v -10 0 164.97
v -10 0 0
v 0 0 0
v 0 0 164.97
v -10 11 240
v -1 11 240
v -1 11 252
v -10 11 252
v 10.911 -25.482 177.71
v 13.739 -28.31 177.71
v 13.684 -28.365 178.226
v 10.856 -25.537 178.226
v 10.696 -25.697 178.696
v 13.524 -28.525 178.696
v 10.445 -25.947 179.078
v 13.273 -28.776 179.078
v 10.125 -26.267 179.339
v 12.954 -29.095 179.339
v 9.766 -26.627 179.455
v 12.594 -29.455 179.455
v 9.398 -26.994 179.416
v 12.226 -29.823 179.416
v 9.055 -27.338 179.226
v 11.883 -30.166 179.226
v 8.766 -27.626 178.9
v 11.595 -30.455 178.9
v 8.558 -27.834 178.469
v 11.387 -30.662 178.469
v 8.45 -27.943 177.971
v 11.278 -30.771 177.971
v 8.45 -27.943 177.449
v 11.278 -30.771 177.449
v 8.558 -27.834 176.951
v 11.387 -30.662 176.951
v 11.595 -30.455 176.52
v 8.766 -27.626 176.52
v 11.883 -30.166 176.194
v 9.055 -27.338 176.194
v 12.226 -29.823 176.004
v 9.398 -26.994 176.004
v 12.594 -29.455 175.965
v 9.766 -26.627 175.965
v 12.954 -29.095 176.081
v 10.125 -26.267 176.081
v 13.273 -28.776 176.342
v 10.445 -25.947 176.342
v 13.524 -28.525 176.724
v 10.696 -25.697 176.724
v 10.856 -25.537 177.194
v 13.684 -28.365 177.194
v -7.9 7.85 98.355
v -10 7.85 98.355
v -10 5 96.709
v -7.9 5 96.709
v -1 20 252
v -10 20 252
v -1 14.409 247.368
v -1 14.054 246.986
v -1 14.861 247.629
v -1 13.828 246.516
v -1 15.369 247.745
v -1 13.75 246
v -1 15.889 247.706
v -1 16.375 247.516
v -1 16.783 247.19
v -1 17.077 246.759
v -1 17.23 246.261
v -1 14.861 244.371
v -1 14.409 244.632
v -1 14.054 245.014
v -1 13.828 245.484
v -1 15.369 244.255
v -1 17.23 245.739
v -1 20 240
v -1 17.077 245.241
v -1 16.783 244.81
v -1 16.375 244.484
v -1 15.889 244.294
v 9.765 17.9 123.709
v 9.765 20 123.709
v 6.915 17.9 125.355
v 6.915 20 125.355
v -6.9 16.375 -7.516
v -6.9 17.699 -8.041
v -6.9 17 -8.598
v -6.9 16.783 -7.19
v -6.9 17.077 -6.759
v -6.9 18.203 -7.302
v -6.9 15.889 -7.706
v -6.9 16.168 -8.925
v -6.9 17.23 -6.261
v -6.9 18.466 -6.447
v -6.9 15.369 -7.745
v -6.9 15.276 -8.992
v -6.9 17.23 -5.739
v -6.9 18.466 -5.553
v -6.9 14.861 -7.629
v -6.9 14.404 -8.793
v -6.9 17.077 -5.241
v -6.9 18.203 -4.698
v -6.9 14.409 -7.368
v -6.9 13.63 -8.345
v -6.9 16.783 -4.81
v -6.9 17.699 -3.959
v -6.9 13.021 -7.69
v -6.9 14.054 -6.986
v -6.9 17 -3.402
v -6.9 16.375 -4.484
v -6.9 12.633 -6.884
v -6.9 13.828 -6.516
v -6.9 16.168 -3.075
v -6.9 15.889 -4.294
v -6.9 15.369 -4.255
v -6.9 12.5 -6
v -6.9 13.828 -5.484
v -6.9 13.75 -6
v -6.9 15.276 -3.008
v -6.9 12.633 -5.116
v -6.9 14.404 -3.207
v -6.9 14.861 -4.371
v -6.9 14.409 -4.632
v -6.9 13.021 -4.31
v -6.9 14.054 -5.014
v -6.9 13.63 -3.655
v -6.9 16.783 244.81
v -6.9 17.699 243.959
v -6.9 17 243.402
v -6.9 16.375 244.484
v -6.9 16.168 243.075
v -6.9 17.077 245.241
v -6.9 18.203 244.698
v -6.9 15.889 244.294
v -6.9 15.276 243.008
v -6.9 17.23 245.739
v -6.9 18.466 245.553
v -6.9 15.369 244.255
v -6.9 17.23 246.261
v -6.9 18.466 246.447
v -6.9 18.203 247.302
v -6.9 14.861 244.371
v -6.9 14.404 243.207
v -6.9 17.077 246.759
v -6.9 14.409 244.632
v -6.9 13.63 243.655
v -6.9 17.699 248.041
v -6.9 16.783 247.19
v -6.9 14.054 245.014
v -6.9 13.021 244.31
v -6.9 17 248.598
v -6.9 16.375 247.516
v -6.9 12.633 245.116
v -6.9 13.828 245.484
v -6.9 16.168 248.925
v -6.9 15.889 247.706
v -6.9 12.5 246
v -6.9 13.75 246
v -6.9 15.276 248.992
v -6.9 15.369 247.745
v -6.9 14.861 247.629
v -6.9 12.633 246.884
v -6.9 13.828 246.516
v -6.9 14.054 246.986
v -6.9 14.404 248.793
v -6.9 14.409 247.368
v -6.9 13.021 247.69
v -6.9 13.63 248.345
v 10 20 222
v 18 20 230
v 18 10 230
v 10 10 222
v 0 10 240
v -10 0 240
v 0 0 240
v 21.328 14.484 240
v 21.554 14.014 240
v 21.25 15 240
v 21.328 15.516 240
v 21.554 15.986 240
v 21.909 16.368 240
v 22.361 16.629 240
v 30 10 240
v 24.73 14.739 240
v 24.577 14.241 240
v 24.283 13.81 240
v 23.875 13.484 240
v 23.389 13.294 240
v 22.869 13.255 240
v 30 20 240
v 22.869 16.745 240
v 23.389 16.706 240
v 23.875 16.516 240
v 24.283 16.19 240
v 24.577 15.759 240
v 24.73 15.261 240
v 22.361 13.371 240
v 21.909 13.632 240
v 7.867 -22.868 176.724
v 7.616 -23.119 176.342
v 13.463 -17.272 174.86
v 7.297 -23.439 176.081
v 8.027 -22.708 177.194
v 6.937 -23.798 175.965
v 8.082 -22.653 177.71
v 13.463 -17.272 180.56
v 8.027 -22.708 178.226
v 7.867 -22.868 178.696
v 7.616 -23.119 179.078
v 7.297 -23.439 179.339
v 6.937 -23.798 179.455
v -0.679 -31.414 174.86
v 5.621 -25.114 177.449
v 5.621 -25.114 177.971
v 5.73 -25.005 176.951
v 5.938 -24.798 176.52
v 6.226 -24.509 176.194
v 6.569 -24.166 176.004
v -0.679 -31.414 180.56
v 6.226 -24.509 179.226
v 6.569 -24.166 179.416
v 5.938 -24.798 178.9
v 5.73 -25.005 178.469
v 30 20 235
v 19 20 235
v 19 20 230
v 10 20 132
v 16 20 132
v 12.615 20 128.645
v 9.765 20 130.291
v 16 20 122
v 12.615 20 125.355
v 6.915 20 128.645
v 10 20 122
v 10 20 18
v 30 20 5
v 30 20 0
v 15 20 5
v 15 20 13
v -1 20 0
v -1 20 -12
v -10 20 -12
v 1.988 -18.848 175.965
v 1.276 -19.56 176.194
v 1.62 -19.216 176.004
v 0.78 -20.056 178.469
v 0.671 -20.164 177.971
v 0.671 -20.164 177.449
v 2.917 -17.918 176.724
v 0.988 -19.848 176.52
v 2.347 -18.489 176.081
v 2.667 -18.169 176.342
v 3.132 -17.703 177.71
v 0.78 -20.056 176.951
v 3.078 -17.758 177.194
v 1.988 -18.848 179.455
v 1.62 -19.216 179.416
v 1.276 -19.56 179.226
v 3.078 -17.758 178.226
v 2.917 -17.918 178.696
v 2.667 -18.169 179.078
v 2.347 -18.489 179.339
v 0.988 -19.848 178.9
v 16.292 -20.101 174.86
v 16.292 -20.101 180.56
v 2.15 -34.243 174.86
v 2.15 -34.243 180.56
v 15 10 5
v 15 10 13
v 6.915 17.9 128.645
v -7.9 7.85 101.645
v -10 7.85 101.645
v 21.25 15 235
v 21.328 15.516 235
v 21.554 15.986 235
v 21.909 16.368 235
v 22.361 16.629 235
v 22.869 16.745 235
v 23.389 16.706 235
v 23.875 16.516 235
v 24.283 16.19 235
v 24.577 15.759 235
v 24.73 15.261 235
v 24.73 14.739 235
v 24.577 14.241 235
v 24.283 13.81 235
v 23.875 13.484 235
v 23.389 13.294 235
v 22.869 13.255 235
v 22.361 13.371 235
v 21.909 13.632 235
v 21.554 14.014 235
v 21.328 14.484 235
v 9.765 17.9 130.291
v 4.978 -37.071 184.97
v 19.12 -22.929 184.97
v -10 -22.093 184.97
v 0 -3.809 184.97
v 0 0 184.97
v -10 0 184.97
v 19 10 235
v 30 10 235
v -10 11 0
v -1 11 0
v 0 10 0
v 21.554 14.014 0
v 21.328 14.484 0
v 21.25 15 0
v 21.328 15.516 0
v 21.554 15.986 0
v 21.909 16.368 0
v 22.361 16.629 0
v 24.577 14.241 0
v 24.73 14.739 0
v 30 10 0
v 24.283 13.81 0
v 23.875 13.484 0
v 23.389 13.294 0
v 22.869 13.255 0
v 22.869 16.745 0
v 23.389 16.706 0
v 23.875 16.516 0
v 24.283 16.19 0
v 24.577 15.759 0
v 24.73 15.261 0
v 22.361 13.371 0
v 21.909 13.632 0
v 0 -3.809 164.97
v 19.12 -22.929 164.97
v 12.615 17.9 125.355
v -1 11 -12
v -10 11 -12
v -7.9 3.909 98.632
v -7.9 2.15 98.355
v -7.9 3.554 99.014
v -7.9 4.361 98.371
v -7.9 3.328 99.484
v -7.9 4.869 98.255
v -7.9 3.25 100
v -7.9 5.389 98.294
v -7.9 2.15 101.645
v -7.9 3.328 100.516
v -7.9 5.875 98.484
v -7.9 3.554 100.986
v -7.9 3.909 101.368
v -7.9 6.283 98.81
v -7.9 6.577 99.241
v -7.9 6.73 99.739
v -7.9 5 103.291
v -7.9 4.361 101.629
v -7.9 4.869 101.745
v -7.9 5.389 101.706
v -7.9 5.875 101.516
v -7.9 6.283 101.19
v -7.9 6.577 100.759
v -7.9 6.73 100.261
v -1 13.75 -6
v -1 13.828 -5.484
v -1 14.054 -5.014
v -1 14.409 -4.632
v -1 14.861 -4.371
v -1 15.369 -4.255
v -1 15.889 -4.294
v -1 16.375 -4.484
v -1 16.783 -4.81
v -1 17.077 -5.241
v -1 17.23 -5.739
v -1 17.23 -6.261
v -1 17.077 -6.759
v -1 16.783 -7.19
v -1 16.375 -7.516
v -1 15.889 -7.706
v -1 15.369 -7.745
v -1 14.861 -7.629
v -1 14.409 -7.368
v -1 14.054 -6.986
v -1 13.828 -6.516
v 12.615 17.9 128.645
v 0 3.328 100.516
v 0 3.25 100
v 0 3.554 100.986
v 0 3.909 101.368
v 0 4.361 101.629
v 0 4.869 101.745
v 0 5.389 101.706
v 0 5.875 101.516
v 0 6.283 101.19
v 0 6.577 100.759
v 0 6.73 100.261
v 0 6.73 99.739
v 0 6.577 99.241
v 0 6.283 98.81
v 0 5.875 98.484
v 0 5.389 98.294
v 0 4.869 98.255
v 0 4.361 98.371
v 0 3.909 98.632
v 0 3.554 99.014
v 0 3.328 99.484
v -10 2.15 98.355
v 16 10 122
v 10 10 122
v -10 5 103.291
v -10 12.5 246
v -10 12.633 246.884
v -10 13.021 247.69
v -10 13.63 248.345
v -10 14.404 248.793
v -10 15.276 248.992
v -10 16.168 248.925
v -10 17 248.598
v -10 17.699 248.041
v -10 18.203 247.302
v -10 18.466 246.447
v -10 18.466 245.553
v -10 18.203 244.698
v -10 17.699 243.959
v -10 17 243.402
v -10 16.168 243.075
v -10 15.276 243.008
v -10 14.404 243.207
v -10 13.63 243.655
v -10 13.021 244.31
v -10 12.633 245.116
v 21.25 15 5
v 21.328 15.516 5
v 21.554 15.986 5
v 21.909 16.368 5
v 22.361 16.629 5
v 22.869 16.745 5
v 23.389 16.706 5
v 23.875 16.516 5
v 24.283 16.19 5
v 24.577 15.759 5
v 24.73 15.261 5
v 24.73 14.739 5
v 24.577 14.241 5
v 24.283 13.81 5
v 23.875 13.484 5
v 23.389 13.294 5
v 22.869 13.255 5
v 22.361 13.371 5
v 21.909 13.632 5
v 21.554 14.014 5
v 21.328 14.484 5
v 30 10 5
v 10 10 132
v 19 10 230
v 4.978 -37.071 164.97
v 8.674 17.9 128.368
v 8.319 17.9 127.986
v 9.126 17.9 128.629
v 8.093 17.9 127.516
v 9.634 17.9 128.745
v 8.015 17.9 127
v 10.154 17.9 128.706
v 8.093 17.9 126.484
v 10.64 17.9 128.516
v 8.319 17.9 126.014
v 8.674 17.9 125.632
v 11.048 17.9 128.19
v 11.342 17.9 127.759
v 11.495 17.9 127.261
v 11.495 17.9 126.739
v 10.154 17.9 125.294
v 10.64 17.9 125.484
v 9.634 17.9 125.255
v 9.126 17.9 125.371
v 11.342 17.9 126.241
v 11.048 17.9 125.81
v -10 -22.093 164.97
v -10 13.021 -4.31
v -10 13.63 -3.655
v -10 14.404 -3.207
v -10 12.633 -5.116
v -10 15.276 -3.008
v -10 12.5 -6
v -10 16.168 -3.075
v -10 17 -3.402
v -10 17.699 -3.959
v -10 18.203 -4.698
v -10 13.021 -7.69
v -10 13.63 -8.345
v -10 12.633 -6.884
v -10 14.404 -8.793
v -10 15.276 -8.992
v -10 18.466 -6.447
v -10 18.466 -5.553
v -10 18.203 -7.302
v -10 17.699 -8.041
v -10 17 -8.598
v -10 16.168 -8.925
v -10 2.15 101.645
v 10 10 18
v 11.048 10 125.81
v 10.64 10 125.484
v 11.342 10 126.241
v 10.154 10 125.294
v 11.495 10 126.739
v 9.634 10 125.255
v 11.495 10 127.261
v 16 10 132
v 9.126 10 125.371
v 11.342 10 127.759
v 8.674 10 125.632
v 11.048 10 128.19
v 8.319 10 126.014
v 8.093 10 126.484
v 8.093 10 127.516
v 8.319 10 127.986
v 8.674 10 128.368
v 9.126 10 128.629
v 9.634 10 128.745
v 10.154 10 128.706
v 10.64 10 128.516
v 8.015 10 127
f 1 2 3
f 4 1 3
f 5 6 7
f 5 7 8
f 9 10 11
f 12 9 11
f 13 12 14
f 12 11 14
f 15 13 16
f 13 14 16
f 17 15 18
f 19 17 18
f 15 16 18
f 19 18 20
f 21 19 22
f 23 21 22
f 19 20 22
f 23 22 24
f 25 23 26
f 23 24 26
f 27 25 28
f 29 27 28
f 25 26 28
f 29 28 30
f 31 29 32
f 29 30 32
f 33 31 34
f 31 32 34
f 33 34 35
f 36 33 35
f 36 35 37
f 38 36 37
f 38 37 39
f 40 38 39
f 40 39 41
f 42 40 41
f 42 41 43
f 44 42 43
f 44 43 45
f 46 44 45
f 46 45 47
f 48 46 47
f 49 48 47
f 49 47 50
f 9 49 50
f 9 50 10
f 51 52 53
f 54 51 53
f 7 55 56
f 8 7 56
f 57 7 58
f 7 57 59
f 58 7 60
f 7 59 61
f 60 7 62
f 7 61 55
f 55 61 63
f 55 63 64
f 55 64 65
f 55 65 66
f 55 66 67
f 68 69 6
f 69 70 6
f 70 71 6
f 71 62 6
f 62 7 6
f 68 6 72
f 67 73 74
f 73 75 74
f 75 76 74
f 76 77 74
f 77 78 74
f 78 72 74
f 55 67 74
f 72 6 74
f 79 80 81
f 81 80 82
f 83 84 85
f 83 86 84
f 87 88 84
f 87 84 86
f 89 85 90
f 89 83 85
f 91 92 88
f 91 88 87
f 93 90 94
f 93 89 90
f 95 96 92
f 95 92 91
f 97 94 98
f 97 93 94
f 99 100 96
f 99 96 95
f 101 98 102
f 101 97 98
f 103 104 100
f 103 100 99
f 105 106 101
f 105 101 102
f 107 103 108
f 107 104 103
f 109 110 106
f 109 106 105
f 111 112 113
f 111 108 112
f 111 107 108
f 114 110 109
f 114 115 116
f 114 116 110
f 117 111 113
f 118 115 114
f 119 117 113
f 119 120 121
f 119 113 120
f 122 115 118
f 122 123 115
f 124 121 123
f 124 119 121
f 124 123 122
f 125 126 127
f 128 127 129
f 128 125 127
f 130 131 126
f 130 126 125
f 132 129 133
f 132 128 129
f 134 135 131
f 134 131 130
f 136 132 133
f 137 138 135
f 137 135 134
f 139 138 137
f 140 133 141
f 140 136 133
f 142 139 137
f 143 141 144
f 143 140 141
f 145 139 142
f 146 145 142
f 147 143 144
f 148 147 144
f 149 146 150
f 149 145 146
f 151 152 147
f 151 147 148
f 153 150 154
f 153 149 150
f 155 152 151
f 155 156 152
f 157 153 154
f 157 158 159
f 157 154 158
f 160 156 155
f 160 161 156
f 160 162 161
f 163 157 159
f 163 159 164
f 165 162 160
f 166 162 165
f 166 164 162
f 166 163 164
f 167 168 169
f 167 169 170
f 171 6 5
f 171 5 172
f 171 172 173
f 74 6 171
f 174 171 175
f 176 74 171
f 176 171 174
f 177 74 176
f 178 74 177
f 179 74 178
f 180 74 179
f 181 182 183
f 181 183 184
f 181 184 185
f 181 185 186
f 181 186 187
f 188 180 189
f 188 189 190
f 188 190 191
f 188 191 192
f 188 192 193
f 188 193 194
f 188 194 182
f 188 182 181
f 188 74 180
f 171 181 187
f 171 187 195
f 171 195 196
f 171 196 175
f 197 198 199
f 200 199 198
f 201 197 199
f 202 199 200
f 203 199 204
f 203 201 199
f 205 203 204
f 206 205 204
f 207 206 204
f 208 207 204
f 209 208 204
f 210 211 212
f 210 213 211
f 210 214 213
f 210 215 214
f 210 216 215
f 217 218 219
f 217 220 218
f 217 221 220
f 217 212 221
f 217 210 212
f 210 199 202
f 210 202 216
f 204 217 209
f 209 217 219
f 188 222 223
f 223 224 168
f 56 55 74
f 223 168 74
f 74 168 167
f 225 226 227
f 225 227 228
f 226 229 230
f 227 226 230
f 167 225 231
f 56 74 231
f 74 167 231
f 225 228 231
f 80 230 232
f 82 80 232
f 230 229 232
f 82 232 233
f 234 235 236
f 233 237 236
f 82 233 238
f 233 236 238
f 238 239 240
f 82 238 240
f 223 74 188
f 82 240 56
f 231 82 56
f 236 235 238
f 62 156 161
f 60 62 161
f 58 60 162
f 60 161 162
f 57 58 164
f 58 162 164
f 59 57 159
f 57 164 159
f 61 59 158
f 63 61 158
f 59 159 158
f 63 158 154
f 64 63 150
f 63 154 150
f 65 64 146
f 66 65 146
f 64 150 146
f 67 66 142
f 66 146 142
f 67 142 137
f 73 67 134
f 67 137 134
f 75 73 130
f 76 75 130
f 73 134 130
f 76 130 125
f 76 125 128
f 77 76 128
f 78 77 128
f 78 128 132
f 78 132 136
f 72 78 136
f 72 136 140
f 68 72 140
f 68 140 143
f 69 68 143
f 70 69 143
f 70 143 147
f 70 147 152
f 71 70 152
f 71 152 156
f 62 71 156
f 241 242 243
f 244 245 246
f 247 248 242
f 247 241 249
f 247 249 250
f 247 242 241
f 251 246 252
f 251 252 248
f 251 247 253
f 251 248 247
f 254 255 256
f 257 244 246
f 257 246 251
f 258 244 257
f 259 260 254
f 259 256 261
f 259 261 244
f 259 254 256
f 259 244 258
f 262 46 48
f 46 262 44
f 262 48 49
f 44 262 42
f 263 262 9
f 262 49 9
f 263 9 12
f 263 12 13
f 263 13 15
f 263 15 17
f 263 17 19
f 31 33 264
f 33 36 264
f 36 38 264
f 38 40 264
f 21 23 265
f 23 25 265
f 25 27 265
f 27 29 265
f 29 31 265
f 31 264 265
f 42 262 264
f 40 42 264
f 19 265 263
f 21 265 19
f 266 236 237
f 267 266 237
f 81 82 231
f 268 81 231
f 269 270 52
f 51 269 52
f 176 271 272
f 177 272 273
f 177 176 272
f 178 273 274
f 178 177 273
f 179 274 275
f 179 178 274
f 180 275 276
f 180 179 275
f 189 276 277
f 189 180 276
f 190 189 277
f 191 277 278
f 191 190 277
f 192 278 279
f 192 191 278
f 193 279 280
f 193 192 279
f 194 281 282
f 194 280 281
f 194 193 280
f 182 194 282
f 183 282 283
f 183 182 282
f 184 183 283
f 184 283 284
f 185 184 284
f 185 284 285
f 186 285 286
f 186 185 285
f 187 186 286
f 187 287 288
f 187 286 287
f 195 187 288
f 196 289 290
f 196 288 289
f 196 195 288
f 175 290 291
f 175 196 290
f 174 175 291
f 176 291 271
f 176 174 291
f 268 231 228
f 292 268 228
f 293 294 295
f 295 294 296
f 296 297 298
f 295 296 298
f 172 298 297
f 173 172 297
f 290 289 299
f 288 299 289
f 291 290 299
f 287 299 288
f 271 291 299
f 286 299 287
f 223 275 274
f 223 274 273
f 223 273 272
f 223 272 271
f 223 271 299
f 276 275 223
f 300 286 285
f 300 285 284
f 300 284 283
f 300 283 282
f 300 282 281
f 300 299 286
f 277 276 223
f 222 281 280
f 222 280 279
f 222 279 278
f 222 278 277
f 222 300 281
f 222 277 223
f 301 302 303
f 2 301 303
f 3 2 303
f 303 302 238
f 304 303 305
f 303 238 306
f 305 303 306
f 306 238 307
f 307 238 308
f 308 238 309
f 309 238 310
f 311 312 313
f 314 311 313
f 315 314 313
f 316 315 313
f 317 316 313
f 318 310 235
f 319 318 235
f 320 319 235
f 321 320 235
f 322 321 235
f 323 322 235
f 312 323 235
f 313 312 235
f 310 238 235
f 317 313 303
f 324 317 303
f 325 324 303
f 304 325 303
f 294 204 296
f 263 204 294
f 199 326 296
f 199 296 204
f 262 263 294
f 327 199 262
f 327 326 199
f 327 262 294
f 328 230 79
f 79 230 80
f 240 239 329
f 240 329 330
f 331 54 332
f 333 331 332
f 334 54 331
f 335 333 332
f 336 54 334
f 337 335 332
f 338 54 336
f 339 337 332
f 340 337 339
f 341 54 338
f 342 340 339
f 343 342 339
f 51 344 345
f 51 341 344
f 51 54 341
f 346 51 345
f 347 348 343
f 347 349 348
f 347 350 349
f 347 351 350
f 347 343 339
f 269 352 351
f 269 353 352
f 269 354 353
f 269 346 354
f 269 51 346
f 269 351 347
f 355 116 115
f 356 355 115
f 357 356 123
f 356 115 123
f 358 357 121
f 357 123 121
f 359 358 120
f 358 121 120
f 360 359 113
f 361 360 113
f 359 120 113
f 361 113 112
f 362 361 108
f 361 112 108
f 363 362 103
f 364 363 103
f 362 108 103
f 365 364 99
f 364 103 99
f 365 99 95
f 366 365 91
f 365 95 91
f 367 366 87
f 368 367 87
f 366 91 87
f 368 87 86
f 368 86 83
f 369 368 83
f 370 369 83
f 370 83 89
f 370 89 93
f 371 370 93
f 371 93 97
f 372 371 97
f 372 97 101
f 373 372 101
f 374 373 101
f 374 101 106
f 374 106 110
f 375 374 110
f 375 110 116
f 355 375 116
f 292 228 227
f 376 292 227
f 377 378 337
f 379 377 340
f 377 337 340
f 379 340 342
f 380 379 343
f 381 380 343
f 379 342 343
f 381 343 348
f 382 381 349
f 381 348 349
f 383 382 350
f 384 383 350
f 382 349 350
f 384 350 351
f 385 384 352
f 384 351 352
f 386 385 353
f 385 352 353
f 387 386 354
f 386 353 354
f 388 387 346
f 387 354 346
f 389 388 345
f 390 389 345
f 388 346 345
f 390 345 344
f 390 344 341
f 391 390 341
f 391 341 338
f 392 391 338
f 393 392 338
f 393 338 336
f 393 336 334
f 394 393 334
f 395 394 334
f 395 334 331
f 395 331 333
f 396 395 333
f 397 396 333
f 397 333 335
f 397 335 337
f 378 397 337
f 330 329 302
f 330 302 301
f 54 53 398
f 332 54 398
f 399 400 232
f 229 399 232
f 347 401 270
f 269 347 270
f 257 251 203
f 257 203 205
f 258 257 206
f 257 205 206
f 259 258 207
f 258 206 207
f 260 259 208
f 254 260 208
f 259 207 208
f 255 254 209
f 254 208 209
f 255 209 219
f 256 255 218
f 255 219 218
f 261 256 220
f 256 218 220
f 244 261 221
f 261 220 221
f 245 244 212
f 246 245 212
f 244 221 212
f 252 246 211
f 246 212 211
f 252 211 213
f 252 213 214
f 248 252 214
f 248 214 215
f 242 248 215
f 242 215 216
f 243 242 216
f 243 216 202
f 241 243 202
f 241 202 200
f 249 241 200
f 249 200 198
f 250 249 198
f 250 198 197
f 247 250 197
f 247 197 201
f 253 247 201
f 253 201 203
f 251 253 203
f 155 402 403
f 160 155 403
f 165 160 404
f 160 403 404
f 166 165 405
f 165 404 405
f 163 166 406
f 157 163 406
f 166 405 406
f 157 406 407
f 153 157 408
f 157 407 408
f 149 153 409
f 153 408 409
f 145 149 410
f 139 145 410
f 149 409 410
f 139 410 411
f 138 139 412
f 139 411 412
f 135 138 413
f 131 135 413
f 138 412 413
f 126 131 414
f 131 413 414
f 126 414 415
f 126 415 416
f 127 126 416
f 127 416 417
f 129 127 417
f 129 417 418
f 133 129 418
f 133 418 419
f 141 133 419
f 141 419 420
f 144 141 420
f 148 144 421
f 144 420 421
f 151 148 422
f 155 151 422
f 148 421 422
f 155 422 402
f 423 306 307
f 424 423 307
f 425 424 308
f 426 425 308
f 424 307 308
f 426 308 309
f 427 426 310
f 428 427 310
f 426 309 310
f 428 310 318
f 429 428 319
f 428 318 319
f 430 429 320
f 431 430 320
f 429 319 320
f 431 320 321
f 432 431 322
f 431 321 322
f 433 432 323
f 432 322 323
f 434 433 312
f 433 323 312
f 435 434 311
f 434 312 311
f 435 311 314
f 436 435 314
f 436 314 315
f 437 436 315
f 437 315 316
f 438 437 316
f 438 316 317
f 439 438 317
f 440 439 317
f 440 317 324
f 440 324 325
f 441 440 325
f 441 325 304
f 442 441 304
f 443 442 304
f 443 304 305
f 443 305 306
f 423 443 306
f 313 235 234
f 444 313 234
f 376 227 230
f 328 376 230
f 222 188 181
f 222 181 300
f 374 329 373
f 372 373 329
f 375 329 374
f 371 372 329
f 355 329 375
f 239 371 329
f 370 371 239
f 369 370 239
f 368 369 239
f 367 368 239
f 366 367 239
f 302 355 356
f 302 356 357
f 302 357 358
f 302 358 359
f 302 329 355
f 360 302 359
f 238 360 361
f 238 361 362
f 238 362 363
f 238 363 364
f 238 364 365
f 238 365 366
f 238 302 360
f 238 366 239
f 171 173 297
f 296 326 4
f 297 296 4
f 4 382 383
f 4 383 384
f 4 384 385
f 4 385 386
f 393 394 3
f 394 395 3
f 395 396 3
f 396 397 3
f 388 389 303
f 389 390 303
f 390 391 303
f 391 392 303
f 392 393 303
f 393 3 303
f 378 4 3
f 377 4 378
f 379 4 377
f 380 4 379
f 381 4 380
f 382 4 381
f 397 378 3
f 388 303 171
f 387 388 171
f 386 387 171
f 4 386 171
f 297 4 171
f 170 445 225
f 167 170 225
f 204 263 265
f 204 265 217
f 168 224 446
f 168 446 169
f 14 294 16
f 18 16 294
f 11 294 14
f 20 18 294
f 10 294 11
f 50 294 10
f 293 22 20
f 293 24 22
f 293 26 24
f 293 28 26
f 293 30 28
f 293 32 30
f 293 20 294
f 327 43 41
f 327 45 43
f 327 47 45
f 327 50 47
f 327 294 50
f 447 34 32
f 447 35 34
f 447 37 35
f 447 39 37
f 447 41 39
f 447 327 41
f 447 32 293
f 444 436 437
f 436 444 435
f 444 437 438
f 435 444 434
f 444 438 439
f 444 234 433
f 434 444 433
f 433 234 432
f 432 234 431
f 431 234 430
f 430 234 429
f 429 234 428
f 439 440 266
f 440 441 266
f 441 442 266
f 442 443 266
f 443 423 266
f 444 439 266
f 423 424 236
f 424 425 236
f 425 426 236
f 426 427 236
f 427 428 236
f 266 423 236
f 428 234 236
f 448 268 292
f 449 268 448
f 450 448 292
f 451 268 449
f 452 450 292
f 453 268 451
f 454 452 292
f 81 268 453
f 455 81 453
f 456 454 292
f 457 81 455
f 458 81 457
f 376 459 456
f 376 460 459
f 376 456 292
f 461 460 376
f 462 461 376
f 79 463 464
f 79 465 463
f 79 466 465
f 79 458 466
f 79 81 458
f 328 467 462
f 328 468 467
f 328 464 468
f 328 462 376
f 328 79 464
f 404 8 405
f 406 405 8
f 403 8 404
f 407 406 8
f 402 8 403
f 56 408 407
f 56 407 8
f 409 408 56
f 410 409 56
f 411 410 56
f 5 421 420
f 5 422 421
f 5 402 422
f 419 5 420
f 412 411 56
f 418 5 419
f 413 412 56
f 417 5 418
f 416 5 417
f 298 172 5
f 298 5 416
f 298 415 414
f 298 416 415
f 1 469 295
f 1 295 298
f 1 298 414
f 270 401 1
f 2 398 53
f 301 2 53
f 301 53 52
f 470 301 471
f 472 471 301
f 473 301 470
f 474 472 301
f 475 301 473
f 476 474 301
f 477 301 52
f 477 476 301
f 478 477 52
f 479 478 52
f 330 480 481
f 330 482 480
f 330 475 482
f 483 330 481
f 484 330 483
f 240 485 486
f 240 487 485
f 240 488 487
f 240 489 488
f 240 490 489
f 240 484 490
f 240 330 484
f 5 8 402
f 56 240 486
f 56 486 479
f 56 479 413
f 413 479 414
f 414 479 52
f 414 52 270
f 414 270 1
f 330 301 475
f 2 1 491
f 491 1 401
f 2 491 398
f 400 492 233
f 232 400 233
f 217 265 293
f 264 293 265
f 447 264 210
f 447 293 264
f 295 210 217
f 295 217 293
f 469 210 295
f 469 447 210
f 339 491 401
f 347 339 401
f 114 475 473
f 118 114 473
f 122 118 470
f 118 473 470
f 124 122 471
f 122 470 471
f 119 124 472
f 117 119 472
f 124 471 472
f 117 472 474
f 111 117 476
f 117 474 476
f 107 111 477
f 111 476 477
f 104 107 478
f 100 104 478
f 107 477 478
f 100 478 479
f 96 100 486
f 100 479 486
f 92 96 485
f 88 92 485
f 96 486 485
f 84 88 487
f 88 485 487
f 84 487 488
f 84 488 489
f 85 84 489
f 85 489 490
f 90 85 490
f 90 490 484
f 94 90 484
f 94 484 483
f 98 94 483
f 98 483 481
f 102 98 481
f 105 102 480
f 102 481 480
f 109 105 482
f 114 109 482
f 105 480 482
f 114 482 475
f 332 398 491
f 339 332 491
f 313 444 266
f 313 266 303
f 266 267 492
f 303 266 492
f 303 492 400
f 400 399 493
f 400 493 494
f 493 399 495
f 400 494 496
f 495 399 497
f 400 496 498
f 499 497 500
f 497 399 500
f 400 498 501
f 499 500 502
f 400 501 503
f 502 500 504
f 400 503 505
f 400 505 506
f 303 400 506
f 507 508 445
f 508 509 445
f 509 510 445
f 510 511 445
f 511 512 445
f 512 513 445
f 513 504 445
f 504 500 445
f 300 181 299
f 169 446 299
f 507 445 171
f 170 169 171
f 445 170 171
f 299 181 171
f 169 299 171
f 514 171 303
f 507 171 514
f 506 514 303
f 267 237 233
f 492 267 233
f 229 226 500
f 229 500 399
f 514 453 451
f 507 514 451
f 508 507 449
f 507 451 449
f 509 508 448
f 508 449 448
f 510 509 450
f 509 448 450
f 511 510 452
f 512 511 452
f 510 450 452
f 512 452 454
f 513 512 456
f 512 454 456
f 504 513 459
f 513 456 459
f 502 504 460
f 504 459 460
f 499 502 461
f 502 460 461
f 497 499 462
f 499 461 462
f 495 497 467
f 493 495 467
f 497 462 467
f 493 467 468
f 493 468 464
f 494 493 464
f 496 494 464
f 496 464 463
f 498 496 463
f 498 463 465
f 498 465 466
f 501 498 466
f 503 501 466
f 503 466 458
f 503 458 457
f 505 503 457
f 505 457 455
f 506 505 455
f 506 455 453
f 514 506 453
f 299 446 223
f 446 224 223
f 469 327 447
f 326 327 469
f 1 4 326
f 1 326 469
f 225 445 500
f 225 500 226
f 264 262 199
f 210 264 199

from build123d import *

# Parameters (mm, degrees)
BOSS_EXTRUDE1_DEPTH      = 240
BOSS_EXTRUDE3_DEPTH      = 10
SKETCH5_R                = 1.75
CUT_EXTRUDE1_DEPTH       = 243.69322199
SKETCH6_W                = 7
SKETCH6_H                = 12
CUT_EXTRUDE2_DEPTH       = 11
BOSS_EXTRUDE5_DEPTH      = 10
BOSS_EXTRUDE5_DEPTH_BACK = 10
SKETCH12_W               = 10
SKETCH12_H               = 10
BOSS_EXTRUDE6_DEPTH      = 6
SKETCH11_R               = 1.75
CUT_EXTRUDE6_DEPTH       = 20
SKETCH13_W               = 9
SKETCH13_H               = 9
BOSS_EXTRUDE7_DEPTH      = 12
SKETCH16_R               = 1.75
CUT_EXTRUDE10_DEPTH      = 9
CUT_EXTRUDE11_DEPTH      = 2.1
SKETCH18_R               = 3
CUT_EXTRUDE12_DEPTH      = 3.1
SKETCH19_R               = 1.75
CUT_EXTRUDE13_DEPTH      = 10
CUT_EXTRUDE14_DEPTH      = 2.1
SKETCH21_R               = 1.75
CUT_EXTRUDE15_DEPTH      = 15
SKETCH22_W               = 5.7
SKETCH22_H               = 4
CUT_EXTRUDE16_DEPTH      = 259.696024874
CUT_EXTRUDE17_DEPTH      = 10


with BuildPart() as part:
    # Sketch1 → Boss-Extrude1 (new body)
    with BuildSketch(Plane.XY):
        Polygon((-10, 0), (0, 0), (0, 10), (10, 10), (10, 20), (-10, 20), align=None)
    extrude(amount=BOSS_EXTRUDE1_DEPTH)

    # Sketch4 → Boss-Extrude3 (add)
    with BuildSketch(Plane(origin=(0, 20, 0), x_dir=(1, 0, 0), z_dir=(0, 1, 0))):
        Polygon((10, 0), (30, 0), (30, -10), (18, -10), (10, -18), align=None)
    boss_extrude3 = extrude(amount=-BOSS_EXTRUDE3_DEPTH)

    # Sketch5 → Cut-Extrude1 (cut, through all)
    with BuildSketch(Plane(origin=(0, 0, 0), x_dir=(-1, 0, 0), z_dir=(0, 0, -1))):
        with Locations((-23, 15)):
            Circle(SKETCH5_R)
    cut_extrude1 = extrude(amount=-CUT_EXTRUDE1_DEPTH, mode=Mode.SUBTRACT)

    # Sketch6 → Cut-Extrude2 (cut)
    with BuildSketch(Plane(origin=(30, 0, 0), x_dir=(0, 0, -1), z_dir=(1, 0, 0))):
        with Locations((-8.5, 15)):
            Rectangle(SKETCH6_W, SKETCH6_H)
    cut_extrude2 = extrude(amount=-CUT_EXTRUDE2_DEPTH, mode=Mode.SUBTRACT)

    # Mirror1: Boss-Extrude3, Cut-Extrude1, Cut-Extrude2 across plane
    add(boss_extrude3.mirror(Plane(origin=(0, 0, 120), x_dir=(1, 0, 0), z_dir=(0, 0, -1))))
    add(cut_extrude1.mirror(Plane(origin=(0, 0, 120), x_dir=(1, 0, 0), z_dir=(0, 0, -1))), mode=Mode.SUBTRACT)
    add(cut_extrude2.mirror(Plane(origin=(0, 0, 120), x_dir=(1, 0, 0), z_dir=(0, 0, -1))), mode=Mode.SUBTRACT)

    # Sketch7 → Boss-Extrude5 (add, two sides: drawn at the far end of the back side and taken through both)
    with BuildSketch(Plane.XY.offset(174.97).offset(-BOSS_EXTRUDE5_DEPTH_BACK)):
        Polygon((0, 0), (0, -3.808764825), (19.120167363, -22.928932188), (4.97803174, -37.071067812), (-10, -22.093036072), (-10, 0), align=None)
    extrude(amount=BOSS_EXTRUDE5_DEPTH + BOSS_EXTRUDE5_DEPTH_BACK)

    # Sketch12 → Boss-Extrude6 (add)
    with BuildSketch(Plane(origin=(10, 0, 0), x_dir=(0, 0, -1), z_dir=(1, 0, 0))):
        with Locations((-127, 15)):
            Rectangle(SKETCH12_W, SKETCH12_H)
    extrude(amount=BOSS_EXTRUDE6_DEPTH)

    # Sketch11 → Cut-Extrude6 (cut)
    with BuildSketch(Plane(origin=(0, 20, 0), x_dir=(1, 0, 0), z_dir=(0, 1, 0))):
        with Locations(Location((9.765, -127, 0), (0, 0, 180))):
            Circle(SKETCH11_R)
    extrude(amount=-CUT_EXTRUDE6_DEPTH, mode=Mode.SUBTRACT)

    # Sketch13 → Boss-Extrude7 (add)
    with BuildSketch(Plane(origin=(0, 0, 0), x_dir=(-1, 0, 0), z_dir=(0, 0, -1))):
        with Locations((5.5, 15.5)):
            Rectangle(SKETCH13_W, SKETCH13_H)
    boss_extrude7 = extrude(amount=BOSS_EXTRUDE7_DEPTH)

    # Mirror2: Boss-Extrude7 across plane
    add(boss_extrude7.mirror(Plane.XY.offset(120)))

    # Sketch16 → Cut-Extrude10 (cut)
    with BuildSketch(Plane.ZY.offset(10)):
        with Locations(Location((-6, 15.5, 0), (0, 0, 270))):
            Circle(SKETCH16_R)
        with Locations(Location((246, 15.5, 0), (0, 0, 270))):
            Circle(SKETCH16_R)
    extrude(amount=-CUT_EXTRUDE10_DEPTH, mode=Mode.SUBTRACT)

    # Sketch17 → Cut-Extrude11 (cut)
    with BuildSketch(Plane(origin=(0, 20, 0), x_dir=(1, 0, 0), z_dir=(0, 1, 0))):
        Polygon((12.615, -128.645448267), (12.615, -125.354551733), (9.765, -123.709103466), (6.915, -125.354551733), (6.915, -128.645448267), (9.765, -130.290896534), align=None)
    extrude(amount=-CUT_EXTRUDE11_DEPTH, mode=Mode.SUBTRACT)

    # Sketch18 → Cut-Extrude12 (cut)
    with BuildSketch(Plane.ZY.offset(10)):
        with Locations(Location((246, 15.5, 0), (0, 0, 270))):
            Circle(SKETCH18_R)
        with Locations(Location((-6, 15.5, 0), (0, 0, 270))):
            Circle(SKETCH18_R)
    extrude(amount=-CUT_EXTRUDE12_DEPTH, mode=Mode.SUBTRACT)

    # Sketch19 → Cut-Extrude13 (cut)
    with BuildSketch(Plane.ZY.offset(10)):
        with Locations(Location((100, 5, 0), (0, 0, 270))):
            Circle(SKETCH19_R)
    extrude(amount=-CUT_EXTRUDE13_DEPTH, mode=Mode.SUBTRACT)

    # Sketch20 → Cut-Extrude14 (cut)
    with BuildSketch(Plane.ZY.offset(10)):
        Polygon((101.645448267, 2.15), (103.290896534, 5), (101.645448267, 7.85), (98.354551733, 7.85), (96.709103466, 5), (98.354551733, 2.15), align=None)
    extrude(amount=-CUT_EXTRUDE14_DEPTH, mode=Mode.SUBTRACT)

    # Sketch21 → Cut-Extrude15 (cut)
    with BuildSketch(Plane(origin=(21.024549776, -21.024549776, 0), x_dir=(0, 0, -1), z_dir=(0.7071067811865436, -0.7071067811865515, 0))):
        with Locations(Location((-177.71, -12.053203436, 0), (0, 0, 90))):
            Circle(SKETCH21_R)
    extrude(amount=-CUT_EXTRUDE15_DEPTH, mode=Mode.SUBTRACT)

    # Sketch22 → Cut-Extrude16 (cut, through all)
    with BuildSketch(Plane(origin=(-16.046518036, -16.046518036, 0), x_dir=(0, 0, 1), z_dir=(-0.7071067811865517, -0.7071067811865435, 0))):
        with Locations((177.71, -23.733203436)):
            Rectangle(SKETCH22_W, SKETCH22_H)
    extrude(amount=-CUT_EXTRUDE16_DEPTH, mode=Mode.SUBTRACT)

    # Sketch23 → Cut-Extrude17 (cut)
    with BuildSketch(Plane(origin=(0, 20, 0), x_dir=(1, 0, 0), z_dir=(0, 1, 0))):
        Polygon((19, -10), (19, -5), (15, -5), (15, -13), (18, -10), align=None)
    extrude(amount=-CUT_EXTRUDE17_DEPTH, mode=Mode.SUBTRACT)


solid = part.part
